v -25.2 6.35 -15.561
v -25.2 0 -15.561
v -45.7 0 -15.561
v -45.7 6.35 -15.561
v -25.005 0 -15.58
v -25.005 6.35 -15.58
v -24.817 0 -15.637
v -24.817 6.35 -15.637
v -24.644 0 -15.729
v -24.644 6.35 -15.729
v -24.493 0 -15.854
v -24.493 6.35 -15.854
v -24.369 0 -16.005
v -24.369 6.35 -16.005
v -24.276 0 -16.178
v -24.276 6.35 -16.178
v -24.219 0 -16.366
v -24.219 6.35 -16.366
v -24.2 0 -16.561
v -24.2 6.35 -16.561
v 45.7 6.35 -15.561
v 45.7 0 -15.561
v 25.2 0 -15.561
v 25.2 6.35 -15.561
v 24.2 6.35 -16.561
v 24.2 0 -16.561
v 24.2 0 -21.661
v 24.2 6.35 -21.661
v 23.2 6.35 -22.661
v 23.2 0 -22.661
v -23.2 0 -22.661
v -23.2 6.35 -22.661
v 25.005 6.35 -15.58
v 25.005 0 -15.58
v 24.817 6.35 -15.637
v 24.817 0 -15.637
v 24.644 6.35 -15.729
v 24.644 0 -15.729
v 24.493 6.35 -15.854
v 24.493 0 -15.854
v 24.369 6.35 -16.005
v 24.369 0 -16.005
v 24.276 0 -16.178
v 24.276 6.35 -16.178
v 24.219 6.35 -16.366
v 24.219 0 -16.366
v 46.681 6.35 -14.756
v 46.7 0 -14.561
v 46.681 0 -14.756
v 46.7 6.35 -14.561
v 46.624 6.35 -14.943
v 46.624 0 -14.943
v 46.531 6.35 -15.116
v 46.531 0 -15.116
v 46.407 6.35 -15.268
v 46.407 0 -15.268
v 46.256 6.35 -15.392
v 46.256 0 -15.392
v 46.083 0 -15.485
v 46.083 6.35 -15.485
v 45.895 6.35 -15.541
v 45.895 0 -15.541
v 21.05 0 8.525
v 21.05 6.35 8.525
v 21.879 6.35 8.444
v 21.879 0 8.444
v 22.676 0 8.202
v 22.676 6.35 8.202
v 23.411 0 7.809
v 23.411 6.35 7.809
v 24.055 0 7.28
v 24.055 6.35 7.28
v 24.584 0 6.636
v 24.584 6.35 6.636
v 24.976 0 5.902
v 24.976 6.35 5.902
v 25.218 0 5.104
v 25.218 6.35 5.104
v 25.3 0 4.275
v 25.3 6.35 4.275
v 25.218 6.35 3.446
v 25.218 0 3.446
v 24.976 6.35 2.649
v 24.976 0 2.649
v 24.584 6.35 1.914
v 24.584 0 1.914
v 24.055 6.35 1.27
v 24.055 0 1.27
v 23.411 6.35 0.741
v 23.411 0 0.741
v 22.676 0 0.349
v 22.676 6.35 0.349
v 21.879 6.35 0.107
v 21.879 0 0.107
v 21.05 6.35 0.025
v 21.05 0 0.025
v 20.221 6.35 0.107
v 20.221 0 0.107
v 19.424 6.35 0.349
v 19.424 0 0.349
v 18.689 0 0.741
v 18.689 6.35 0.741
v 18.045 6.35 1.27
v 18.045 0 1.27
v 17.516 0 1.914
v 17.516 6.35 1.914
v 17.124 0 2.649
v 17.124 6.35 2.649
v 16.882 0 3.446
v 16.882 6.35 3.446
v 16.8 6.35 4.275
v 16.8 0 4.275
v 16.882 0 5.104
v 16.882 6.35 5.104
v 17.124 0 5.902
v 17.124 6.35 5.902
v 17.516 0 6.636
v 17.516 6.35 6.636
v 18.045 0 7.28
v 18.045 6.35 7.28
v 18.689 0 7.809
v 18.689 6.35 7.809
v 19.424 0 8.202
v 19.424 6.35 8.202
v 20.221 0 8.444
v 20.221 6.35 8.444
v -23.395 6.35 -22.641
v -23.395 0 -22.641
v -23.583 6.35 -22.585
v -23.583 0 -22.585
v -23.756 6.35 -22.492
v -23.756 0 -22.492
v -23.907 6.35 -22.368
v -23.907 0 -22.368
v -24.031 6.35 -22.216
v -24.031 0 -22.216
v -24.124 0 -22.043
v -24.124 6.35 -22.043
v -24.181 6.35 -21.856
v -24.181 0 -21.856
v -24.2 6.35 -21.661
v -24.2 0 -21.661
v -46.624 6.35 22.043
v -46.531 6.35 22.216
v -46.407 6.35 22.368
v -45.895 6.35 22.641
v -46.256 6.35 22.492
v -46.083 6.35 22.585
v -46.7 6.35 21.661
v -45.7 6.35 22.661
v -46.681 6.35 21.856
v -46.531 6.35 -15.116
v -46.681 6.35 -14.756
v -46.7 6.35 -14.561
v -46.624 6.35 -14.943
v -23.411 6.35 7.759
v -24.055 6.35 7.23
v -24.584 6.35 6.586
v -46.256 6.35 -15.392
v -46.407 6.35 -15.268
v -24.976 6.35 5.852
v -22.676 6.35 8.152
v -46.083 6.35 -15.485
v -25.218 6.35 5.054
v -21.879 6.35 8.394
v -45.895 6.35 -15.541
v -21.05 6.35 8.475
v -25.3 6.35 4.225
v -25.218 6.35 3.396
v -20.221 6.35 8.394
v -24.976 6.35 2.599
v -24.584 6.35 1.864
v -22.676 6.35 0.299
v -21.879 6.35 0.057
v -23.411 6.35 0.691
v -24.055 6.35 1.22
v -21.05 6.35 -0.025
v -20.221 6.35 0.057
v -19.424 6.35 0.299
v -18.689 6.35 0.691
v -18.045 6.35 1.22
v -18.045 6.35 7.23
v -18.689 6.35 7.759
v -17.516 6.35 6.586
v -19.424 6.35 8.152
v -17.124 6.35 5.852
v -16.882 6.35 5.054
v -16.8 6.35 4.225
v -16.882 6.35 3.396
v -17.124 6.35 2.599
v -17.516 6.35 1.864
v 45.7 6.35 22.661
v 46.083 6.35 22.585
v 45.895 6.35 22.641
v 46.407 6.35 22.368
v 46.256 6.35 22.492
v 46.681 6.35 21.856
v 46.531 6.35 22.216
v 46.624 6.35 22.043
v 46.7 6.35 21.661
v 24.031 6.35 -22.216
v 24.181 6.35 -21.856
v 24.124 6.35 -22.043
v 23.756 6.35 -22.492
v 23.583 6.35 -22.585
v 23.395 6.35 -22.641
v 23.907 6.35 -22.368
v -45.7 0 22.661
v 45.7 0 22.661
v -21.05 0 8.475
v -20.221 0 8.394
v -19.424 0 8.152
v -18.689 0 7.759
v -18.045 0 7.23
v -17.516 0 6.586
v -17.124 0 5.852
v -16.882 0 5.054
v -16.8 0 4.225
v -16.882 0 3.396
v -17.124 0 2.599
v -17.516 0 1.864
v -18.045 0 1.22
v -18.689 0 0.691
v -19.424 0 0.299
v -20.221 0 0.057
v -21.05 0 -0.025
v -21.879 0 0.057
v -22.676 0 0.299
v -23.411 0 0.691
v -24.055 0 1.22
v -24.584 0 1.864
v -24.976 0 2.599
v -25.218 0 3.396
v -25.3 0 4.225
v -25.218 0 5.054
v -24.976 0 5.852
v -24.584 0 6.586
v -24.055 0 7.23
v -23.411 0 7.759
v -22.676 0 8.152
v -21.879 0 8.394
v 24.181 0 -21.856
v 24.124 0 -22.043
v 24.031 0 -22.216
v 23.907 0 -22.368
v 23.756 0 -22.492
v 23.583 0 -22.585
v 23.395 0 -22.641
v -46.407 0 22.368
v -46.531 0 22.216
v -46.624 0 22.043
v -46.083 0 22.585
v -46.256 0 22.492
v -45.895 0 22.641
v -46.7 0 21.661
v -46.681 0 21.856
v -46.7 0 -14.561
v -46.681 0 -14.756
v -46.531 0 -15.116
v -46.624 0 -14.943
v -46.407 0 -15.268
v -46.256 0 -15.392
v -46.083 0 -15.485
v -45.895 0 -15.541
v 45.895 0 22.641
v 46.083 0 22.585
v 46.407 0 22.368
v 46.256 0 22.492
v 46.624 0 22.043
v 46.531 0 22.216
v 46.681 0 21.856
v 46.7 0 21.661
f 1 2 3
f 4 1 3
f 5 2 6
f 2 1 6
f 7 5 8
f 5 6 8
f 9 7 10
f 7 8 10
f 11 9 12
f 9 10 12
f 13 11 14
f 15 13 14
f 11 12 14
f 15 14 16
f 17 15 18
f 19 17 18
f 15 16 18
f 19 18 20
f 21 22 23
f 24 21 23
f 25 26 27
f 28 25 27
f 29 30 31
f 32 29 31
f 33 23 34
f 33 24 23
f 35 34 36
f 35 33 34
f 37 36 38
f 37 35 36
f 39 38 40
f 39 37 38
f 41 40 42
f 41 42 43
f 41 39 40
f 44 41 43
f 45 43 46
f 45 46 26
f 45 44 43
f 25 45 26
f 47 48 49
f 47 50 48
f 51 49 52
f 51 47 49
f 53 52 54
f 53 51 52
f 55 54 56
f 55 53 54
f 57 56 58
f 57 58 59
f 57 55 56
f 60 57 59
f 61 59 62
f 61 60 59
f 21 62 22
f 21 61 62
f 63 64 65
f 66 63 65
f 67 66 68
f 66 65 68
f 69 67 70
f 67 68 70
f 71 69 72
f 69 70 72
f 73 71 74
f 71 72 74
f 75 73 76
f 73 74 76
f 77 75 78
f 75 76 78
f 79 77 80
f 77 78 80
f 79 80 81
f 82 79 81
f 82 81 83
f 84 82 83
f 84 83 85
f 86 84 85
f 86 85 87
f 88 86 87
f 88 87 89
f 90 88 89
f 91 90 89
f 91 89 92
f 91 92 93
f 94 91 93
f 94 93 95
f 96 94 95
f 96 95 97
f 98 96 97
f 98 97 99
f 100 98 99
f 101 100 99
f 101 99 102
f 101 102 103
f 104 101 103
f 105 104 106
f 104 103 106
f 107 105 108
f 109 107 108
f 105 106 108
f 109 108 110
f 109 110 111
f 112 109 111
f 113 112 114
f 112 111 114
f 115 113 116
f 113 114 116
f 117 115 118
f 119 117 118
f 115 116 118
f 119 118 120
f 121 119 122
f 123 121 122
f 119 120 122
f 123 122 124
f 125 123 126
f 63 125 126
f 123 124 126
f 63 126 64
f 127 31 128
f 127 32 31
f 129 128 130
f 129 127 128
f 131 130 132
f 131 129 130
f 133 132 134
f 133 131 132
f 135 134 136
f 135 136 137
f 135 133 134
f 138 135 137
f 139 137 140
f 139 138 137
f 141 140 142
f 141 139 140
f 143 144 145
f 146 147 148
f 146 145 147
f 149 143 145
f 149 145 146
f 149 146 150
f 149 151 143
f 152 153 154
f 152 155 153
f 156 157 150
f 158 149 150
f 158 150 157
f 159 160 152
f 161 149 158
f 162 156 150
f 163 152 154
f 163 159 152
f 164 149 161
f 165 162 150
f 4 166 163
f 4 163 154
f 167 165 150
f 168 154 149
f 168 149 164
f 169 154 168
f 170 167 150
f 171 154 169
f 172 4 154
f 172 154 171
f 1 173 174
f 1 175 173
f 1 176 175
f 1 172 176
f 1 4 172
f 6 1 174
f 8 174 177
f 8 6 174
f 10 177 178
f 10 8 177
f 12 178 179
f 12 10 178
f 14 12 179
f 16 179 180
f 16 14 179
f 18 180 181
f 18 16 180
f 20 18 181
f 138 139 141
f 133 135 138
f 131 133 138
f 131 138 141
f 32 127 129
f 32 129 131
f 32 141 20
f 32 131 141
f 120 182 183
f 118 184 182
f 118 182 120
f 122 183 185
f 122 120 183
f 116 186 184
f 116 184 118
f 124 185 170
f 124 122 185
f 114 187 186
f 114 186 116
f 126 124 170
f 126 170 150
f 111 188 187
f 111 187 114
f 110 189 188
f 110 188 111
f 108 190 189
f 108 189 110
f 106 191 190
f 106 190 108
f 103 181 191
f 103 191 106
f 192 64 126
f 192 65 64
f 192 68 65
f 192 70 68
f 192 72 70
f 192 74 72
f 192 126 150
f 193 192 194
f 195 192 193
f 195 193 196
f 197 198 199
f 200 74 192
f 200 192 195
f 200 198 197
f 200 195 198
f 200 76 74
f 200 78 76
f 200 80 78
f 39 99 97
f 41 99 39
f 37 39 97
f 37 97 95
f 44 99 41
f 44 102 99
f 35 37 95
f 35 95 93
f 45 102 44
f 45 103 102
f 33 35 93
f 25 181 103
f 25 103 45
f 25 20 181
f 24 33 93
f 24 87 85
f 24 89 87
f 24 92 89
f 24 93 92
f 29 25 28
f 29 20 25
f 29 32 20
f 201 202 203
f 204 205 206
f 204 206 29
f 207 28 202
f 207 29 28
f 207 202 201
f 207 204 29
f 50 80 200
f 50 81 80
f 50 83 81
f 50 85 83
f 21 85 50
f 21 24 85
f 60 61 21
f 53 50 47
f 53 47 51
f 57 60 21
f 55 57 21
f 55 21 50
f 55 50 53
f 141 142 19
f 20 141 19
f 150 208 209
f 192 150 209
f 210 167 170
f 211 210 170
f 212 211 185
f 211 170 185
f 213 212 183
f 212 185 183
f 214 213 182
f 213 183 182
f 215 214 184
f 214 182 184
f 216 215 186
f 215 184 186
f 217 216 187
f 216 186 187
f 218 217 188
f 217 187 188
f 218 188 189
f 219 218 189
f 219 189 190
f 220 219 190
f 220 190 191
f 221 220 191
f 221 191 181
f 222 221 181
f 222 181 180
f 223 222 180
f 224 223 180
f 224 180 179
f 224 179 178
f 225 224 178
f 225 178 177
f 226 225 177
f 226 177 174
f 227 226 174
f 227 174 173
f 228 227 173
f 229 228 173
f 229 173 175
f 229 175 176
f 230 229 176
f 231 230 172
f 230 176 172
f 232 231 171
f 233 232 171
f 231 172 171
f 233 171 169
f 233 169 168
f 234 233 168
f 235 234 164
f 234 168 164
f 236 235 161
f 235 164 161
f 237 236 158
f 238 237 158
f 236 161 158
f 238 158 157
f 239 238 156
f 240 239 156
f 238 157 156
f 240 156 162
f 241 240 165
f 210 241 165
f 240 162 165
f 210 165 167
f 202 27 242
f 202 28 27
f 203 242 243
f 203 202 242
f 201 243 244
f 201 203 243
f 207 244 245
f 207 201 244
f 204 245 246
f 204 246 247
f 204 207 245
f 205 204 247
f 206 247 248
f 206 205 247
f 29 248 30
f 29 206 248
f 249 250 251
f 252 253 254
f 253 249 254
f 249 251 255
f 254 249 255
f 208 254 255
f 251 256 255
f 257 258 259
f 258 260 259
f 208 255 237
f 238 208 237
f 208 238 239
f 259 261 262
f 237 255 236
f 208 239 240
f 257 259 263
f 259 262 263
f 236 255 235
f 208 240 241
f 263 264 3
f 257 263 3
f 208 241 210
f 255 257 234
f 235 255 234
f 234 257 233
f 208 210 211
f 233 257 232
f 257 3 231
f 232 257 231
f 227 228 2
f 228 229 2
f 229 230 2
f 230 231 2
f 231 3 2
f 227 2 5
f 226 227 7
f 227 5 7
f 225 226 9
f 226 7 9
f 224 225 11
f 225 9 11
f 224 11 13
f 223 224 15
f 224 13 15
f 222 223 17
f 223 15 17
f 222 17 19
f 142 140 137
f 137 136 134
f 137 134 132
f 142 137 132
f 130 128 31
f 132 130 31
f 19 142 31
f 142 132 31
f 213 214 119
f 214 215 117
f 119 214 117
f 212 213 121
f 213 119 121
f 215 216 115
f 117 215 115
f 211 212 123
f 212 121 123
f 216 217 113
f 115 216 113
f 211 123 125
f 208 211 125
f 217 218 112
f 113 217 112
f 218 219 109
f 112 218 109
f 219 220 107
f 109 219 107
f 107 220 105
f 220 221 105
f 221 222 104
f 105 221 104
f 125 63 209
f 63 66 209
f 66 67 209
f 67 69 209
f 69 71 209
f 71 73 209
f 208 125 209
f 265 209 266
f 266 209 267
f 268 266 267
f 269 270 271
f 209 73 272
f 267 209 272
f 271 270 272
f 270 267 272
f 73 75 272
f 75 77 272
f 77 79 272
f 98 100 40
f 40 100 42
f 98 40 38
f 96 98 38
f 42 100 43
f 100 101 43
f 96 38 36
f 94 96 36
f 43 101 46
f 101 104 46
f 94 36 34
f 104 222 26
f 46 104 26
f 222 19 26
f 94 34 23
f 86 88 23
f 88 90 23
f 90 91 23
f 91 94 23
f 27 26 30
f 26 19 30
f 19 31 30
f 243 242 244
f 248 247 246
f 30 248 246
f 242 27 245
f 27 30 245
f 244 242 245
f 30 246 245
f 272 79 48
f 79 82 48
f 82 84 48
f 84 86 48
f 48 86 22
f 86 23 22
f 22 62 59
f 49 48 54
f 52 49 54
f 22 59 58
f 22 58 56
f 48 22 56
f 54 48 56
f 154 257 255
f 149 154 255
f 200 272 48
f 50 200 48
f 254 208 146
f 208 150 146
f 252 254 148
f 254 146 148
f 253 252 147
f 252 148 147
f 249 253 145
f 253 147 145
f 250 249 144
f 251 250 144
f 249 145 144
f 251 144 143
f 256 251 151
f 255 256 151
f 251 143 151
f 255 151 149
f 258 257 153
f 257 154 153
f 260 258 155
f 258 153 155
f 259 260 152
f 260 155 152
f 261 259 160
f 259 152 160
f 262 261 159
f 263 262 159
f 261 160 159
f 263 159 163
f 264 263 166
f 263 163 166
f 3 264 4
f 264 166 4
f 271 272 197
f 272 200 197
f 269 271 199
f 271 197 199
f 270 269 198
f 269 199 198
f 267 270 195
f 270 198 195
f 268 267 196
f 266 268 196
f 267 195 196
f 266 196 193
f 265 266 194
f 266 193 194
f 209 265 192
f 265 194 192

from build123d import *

# Parameters (mm, degrees)
BOSS_EXTRUDE2_DEPTH = 6.35
SKETCH3_R           = 4.25
CUT_EXTRUDE1_DEPTH  = 53.294538816
FILLET1_R           = 1


with BuildPart() as part:
    # Sketch2 → Boss-Extrude2 (new body)
    with BuildSketch(Plane(origin=(0, 0, 0), x_dir=(1, 0, 0), z_dir=(0, 1, 0))):
        Polygon((46.7, -22.660677173), (46.7, 15.560677173), (24.2, 15.560677173), (24.2, 22.660677173), (-24.2, 22.660677173), (-24.2, 15.560677173), (-46.7, 15.560677173), (-46.7, -22.660677173), align=None)
    extrude(amount=BOSS_EXTRUDE2_DEPTH)

    # Sketch3 → Cut-Extrude1 (cut, through all)
    with BuildSketch(Plane(origin=(0, 6.35, 0), x_dir=(1, 0, 0), z_dir=(0, 1, 0))):
        with Locations(Location((-21.05, -4.225241458, 0), (0, 0, 270))):
            Circle(SKETCH3_R)
        with Locations(Location((21.05, -4.275241458, 0), (0, 0, 270))):
            Circle(SKETCH3_R)
    extrude(amount=-CUT_EXTRUDE1_DEPTH, mode=Mode.SUBTRACT)

    # Fillet1
    fillet1_edges = [part.edges().sort_by_distance(p)[0] for p in [
        (-46.7, 3.175, 22.660677173),
        (-46.7, 3.175, -15.560677173),
        (-24.2, 3.175, -15.560677173),
        (-24.2, 3.175, -22.660677173),
        (24.2, 3.175, -22.660677173),
        (24.2, 3.175, -15.560677173),
        (46.7, 3.175, -15.560677173),
        (46.7, 3.175, 22.660677173),
    ]]
    fillet(fillet1_edges, radius=FILLET1_R)


solid = part.part
